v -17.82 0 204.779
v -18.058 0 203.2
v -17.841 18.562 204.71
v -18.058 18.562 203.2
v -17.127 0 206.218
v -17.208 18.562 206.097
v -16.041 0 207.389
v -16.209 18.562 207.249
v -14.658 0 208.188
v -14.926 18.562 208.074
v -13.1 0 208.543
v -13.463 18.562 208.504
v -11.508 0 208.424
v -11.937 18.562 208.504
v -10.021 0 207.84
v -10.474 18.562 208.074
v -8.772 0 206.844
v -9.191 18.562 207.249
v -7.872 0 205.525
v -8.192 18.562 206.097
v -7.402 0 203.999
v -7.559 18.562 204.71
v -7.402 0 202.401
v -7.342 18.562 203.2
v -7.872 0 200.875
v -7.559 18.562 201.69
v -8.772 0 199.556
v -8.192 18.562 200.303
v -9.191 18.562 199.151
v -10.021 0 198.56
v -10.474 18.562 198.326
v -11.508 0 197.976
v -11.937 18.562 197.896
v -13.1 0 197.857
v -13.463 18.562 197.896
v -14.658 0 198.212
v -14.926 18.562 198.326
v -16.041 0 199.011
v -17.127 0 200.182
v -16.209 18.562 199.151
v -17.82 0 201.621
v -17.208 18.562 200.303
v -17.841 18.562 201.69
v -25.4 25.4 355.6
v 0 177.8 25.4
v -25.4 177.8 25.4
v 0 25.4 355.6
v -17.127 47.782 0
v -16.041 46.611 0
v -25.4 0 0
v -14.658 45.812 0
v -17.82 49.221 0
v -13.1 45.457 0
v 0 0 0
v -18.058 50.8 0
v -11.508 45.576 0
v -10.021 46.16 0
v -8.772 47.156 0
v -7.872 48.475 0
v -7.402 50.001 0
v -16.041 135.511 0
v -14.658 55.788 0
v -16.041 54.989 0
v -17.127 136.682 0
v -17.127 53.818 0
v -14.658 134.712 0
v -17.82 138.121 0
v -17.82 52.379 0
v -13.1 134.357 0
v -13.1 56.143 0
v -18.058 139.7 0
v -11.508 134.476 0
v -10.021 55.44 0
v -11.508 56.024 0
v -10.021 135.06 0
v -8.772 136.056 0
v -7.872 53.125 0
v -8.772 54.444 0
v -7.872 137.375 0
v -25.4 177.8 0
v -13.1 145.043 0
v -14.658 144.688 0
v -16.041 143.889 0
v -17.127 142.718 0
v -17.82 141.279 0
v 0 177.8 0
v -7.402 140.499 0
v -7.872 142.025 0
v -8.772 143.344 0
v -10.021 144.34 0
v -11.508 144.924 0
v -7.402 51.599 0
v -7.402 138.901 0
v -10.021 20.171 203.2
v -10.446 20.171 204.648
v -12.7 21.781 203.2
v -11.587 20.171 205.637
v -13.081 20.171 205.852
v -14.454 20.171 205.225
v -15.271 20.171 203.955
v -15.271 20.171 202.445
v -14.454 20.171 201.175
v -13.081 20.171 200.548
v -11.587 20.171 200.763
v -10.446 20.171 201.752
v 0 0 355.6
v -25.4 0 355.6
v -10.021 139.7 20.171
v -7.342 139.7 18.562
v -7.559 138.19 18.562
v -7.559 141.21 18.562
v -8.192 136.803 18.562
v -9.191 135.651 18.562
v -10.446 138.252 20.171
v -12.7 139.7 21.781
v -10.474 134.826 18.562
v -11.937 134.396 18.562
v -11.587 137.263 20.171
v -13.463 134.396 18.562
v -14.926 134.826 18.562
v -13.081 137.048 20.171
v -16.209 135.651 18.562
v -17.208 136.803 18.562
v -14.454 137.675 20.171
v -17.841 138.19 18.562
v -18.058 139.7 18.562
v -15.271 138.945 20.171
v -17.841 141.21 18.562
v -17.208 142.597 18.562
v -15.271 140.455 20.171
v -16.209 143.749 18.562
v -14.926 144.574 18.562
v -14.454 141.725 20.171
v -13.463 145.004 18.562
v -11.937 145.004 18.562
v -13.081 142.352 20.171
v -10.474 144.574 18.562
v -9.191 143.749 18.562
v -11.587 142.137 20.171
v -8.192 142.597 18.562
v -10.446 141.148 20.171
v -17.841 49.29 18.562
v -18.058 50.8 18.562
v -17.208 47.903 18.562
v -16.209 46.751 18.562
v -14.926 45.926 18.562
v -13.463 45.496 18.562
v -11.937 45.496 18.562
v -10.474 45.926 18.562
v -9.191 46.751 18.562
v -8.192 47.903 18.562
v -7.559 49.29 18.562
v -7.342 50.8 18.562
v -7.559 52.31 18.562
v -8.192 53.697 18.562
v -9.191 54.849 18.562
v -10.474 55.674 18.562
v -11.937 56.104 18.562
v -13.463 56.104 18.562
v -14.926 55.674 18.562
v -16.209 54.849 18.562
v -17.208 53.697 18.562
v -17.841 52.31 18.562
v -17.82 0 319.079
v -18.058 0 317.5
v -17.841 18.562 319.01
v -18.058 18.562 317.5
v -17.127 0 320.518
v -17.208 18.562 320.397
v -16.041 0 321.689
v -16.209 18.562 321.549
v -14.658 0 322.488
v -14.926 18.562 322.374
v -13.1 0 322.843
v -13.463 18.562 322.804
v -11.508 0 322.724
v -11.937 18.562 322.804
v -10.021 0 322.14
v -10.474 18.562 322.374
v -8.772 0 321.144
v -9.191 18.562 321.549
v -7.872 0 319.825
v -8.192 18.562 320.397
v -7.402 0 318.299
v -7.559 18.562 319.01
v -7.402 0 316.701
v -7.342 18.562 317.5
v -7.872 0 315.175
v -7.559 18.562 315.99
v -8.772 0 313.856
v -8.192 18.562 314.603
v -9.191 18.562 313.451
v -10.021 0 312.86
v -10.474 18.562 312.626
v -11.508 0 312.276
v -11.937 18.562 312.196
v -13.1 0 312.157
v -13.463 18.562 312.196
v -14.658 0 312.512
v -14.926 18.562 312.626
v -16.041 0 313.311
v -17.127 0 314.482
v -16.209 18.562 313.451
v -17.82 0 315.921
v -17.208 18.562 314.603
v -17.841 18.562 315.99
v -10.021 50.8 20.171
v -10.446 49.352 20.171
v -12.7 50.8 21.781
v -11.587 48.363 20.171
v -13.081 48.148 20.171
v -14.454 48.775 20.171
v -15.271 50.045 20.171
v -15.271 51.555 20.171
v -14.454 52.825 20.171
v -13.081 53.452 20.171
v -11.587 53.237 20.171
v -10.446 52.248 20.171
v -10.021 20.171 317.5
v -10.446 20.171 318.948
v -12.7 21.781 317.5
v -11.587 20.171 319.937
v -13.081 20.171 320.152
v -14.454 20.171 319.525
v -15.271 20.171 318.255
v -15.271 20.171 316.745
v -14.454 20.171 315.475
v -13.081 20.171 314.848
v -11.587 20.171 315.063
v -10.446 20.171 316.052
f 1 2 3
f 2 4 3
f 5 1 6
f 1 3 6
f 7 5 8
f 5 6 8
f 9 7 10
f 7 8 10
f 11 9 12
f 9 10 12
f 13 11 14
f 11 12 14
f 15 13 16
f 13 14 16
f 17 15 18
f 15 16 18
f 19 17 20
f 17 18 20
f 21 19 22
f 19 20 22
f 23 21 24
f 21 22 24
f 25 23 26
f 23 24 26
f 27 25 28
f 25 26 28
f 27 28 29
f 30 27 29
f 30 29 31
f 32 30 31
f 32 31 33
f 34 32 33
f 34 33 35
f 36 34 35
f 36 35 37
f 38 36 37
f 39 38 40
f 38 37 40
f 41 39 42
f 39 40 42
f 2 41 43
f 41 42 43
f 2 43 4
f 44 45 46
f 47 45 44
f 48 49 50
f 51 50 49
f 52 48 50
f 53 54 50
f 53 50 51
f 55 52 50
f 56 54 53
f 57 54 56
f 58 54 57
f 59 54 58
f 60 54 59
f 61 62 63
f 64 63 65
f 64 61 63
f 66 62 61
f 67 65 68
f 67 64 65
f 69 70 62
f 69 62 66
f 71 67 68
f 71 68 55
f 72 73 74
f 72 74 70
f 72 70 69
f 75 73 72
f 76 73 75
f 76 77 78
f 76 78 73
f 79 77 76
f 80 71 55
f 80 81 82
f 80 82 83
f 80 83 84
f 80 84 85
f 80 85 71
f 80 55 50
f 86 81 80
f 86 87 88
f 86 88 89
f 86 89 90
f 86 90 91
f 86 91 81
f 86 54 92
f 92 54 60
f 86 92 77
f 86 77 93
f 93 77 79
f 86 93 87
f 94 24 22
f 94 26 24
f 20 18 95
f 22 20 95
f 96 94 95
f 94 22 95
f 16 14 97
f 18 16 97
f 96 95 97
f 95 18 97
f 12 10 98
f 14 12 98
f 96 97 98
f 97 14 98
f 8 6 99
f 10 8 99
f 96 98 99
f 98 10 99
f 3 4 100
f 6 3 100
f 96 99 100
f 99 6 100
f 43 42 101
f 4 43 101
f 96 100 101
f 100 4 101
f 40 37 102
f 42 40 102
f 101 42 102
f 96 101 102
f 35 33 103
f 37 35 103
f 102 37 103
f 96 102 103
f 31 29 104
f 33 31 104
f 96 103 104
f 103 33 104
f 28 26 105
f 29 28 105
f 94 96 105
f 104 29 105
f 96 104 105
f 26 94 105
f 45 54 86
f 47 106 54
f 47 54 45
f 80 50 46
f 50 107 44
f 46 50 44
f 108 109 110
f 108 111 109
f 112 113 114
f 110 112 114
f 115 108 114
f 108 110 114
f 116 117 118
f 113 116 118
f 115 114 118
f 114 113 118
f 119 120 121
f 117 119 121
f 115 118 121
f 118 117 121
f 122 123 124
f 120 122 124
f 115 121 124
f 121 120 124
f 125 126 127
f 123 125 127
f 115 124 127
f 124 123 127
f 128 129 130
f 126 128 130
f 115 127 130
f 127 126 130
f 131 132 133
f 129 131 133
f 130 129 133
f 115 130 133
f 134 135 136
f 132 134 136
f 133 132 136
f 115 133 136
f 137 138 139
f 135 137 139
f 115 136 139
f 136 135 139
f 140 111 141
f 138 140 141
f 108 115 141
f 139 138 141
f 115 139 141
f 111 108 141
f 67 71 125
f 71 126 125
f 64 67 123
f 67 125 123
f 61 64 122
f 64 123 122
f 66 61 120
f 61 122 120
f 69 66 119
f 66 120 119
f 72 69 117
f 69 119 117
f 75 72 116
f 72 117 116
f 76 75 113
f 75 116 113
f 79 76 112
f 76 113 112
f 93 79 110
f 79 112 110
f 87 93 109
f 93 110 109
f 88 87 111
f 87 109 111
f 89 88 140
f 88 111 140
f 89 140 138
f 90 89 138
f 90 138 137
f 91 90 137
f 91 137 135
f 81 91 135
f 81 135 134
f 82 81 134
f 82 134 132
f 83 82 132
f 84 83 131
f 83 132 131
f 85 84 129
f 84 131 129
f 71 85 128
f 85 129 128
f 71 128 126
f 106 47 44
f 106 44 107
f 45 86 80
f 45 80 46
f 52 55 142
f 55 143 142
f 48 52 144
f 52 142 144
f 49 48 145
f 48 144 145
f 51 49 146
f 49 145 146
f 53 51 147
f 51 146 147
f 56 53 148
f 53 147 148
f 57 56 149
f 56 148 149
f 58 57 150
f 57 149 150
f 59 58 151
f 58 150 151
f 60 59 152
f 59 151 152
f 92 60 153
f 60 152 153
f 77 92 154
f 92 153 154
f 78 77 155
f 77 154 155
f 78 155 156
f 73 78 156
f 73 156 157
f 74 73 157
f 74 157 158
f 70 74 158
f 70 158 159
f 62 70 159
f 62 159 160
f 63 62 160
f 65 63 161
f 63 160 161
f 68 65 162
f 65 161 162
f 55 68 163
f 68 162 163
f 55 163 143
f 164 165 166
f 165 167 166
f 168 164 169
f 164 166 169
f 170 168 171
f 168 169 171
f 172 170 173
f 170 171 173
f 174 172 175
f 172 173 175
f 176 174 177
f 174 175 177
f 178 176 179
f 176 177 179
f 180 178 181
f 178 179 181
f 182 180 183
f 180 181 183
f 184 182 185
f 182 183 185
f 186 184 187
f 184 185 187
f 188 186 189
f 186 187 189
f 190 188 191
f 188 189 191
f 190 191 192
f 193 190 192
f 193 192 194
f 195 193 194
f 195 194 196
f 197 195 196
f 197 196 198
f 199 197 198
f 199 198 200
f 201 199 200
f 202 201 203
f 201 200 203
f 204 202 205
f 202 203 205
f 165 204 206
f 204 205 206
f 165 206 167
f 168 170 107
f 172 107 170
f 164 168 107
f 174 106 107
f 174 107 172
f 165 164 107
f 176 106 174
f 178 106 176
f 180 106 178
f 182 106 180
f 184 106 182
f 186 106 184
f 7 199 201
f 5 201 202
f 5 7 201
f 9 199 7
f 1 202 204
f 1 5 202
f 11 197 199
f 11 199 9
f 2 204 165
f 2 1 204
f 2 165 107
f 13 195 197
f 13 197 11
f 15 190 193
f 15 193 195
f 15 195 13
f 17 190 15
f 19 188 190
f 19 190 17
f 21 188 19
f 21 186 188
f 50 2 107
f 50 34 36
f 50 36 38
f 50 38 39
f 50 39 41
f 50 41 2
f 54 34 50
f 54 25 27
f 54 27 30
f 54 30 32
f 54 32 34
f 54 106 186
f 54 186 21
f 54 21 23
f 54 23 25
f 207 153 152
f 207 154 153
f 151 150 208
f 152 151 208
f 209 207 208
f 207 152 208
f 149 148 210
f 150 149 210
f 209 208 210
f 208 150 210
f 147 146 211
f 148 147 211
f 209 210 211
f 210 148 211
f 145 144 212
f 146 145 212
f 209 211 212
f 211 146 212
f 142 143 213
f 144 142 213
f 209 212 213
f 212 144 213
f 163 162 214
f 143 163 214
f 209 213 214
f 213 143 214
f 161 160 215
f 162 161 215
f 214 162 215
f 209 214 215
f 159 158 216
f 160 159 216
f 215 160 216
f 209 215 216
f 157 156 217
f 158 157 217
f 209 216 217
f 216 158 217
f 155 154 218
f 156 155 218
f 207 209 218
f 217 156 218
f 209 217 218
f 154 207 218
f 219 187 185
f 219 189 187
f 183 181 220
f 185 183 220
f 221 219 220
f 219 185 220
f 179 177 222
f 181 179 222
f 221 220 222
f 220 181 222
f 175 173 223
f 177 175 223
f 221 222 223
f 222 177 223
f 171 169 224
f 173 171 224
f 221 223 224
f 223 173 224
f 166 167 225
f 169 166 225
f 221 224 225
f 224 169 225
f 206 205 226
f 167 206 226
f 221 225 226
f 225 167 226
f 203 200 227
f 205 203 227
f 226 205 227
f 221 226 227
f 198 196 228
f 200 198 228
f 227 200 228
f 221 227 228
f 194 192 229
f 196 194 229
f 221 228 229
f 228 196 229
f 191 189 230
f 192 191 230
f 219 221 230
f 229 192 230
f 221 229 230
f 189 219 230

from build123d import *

# Parameters (mm, degrees)
F1_DEPTH = 25.4
F3_D     = 10.71626
F3_DEPTH = 18.5615384615
F3_TIP   = 3.2194893086
F5_D     = 10.71626
F5_DEPTH = 18.561558
F5_TIP   = 3.2194893086


with BuildPart() as f1:
    # F0 (on Right) → F1 (new body)
    with BuildSketch(Plane.YZ):
        Polygon((0, 355.6), (0, 0), (177.8, 0), (177.8, 25.4), (25.4, 355.6), align=None)
    extrude(amount=-F1_DEPTH)

    # F3
    with Locations(Plane.XZ):
        with Locations((-12.7, 317.5), (-12.7, 203.2)):
            Hole(F3_D / 2, depth=F3_DEPTH)
            with Locations((0, 0, -(F3_DEPTH + F3_TIP / 2))):  # 118° drill point
                Cone(0, F3_D / 2, F3_TIP, mode=Mode.SUBTRACT)

    # F5
    with Locations(Plane(origin=(0, 0, 0), x_dir=(1, 0, 0), z_dir=(0, 0, -1))):
        with Locations((-12.7, -50.8), (-12.7, -139.7)):
            Hole(F5_D / 2, depth=F5_DEPTH)
            with Locations((0, 0, -(F5_DEPTH + F5_TIP / 2))):  # 118° drill point
                Cone(0, F5_D / 2, F5_TIP, mode=Mode.SUBTRACT)


solid = f1.part
